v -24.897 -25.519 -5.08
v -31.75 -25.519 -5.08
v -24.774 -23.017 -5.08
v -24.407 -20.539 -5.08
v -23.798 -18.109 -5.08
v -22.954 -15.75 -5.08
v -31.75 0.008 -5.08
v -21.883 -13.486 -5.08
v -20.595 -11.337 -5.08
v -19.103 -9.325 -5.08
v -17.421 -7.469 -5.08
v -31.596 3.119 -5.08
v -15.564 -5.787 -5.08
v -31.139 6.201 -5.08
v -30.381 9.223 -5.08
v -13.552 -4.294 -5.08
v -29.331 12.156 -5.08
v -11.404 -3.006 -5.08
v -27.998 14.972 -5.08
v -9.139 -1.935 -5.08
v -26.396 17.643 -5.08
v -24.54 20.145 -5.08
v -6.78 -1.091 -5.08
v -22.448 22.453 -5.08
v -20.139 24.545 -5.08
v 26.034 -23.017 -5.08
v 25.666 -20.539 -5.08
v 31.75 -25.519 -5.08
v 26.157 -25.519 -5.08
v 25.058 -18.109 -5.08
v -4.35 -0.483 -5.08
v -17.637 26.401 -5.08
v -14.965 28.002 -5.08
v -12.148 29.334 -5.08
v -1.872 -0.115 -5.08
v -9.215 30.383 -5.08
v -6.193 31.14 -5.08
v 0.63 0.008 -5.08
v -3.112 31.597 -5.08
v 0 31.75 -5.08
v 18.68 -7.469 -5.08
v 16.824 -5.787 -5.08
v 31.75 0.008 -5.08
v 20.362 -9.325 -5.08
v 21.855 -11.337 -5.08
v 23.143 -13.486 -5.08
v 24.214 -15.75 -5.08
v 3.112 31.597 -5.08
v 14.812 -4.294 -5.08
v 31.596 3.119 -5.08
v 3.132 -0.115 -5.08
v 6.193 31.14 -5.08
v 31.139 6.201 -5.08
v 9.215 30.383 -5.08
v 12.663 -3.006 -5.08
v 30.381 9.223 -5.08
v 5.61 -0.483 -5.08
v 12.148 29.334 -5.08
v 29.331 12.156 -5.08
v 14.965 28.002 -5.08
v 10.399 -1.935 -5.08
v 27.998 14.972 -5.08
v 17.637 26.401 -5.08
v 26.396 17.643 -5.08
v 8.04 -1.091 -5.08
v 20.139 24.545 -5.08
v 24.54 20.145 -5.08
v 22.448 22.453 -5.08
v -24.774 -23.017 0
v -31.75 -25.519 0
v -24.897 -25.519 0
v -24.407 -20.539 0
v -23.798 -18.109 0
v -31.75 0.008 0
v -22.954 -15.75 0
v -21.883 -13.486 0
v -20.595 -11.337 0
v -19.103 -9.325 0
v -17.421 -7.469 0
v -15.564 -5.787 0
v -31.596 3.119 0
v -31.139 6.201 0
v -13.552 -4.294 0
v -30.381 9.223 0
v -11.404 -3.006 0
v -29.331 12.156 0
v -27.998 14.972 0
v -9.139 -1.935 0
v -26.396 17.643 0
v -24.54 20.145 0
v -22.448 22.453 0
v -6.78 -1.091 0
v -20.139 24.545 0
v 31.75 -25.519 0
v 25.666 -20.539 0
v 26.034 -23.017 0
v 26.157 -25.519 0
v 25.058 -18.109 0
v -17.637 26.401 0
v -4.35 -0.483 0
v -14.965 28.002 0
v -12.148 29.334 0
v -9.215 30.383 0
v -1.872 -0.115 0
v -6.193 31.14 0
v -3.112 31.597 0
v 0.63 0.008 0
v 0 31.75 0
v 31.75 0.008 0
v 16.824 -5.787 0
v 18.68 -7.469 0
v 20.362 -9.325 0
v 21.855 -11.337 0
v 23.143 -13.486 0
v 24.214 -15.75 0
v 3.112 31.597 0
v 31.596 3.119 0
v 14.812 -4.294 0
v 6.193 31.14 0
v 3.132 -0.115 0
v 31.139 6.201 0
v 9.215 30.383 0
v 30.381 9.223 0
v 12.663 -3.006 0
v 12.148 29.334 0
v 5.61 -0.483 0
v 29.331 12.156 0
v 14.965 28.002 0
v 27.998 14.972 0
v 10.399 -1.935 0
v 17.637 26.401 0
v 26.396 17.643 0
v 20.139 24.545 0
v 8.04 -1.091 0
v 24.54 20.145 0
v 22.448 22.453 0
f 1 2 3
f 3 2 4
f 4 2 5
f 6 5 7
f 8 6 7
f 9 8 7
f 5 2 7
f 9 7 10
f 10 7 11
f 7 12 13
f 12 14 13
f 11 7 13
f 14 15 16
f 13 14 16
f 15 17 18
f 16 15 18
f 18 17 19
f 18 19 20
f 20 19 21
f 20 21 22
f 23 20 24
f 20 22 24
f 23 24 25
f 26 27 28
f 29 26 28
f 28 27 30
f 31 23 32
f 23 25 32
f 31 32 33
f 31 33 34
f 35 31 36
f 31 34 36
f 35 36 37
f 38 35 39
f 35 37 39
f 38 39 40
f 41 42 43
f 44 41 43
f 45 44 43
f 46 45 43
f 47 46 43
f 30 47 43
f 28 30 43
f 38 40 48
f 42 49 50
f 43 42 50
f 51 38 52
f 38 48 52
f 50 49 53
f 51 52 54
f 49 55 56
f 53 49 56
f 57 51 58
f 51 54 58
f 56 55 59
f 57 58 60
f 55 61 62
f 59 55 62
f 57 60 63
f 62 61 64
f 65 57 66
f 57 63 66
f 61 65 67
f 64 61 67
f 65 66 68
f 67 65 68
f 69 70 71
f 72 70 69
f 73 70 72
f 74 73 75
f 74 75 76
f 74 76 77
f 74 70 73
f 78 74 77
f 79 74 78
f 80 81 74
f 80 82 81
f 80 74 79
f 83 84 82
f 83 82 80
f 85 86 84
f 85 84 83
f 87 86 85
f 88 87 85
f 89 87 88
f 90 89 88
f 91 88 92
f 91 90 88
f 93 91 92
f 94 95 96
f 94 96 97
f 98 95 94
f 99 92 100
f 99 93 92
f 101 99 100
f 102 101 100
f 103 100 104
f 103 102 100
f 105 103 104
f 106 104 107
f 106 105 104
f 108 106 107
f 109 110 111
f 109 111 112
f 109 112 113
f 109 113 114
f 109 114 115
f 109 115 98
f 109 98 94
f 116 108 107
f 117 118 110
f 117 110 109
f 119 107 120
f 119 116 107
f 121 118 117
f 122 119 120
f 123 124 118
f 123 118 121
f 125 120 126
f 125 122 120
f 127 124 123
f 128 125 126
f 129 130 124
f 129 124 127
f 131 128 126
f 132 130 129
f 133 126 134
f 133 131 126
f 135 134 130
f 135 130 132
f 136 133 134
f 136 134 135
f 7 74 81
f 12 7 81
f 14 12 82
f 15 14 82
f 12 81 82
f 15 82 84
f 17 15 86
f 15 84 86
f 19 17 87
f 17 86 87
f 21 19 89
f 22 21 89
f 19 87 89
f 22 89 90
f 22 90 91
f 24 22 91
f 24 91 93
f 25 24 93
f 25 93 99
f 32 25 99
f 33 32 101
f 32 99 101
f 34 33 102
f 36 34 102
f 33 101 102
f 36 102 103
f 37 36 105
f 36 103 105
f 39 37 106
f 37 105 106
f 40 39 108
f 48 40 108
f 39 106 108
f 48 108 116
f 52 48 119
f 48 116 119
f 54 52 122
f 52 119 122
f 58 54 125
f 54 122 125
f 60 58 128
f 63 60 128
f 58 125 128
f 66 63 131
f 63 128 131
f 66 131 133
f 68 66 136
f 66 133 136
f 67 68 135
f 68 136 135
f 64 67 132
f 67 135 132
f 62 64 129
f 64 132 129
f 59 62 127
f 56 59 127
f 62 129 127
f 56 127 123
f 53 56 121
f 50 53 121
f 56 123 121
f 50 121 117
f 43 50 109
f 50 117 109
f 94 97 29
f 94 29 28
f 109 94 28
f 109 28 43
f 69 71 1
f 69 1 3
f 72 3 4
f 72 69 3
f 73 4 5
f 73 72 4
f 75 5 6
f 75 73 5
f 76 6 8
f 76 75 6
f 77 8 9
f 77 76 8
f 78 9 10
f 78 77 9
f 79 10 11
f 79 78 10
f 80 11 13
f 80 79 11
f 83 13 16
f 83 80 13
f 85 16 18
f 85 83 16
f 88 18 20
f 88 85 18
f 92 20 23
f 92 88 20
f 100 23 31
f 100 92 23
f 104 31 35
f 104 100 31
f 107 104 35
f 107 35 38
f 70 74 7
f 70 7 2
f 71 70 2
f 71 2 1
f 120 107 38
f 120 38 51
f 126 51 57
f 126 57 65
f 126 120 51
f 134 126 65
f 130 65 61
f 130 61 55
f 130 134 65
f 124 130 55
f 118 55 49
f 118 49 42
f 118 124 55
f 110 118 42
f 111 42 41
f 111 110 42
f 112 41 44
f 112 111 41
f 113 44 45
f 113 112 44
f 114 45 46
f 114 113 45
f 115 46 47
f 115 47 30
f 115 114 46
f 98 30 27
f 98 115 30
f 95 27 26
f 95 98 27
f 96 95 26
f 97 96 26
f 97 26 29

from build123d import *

# Parameters (mm, degrees)
BOSS_EXTRUDE1_DEPTH = 5.08


with BuildPart() as part:
    # Sketch1 → Boss-Extrude1 (new body)
    with BuildSketch(Plane.XY):
        with BuildLine():
            Line((0.629745632, 0.007769029), (-31.749999049, 0.007769029))
            Line((-31.749999049, 0.007769029), (-31.749999049, -25.519230971))
            Line((-31.749999049, -25.519230971), (-24.897254295, -25.519230971))
            ThreePointArc((-24.897254295, -25.519230971), (-17.420569124, -7.468916193), (0.629745632, 0.007769029))
        make_face()
        with BuildLine():
            Line((31.749999049, 0.007769029), (0.629745632, 0.007769029))
            ThreePointArc((0.629745632, 0.007769029), (18.680060482, -7.468916142), (26.156745705, -25.519230971))
            Line((26.156745705, -25.519230971), (31.749999049, -25.519230971))
            Line((31.749999049, -25.519230971), (31.749999049, 0.007769029))
        make_face()
        with BuildLine():
            ThreePointArc((-31.749999049, 0.007769029), (0, 31.75), (31.749999049, 0.007769029))
            Line((31.749999049, 0.007769029), (-31.749999049, 0.007769029))
        make_face()
    extrude(amount=-BOSS_EXTRUDE1_DEPTH)


solid = part.part
